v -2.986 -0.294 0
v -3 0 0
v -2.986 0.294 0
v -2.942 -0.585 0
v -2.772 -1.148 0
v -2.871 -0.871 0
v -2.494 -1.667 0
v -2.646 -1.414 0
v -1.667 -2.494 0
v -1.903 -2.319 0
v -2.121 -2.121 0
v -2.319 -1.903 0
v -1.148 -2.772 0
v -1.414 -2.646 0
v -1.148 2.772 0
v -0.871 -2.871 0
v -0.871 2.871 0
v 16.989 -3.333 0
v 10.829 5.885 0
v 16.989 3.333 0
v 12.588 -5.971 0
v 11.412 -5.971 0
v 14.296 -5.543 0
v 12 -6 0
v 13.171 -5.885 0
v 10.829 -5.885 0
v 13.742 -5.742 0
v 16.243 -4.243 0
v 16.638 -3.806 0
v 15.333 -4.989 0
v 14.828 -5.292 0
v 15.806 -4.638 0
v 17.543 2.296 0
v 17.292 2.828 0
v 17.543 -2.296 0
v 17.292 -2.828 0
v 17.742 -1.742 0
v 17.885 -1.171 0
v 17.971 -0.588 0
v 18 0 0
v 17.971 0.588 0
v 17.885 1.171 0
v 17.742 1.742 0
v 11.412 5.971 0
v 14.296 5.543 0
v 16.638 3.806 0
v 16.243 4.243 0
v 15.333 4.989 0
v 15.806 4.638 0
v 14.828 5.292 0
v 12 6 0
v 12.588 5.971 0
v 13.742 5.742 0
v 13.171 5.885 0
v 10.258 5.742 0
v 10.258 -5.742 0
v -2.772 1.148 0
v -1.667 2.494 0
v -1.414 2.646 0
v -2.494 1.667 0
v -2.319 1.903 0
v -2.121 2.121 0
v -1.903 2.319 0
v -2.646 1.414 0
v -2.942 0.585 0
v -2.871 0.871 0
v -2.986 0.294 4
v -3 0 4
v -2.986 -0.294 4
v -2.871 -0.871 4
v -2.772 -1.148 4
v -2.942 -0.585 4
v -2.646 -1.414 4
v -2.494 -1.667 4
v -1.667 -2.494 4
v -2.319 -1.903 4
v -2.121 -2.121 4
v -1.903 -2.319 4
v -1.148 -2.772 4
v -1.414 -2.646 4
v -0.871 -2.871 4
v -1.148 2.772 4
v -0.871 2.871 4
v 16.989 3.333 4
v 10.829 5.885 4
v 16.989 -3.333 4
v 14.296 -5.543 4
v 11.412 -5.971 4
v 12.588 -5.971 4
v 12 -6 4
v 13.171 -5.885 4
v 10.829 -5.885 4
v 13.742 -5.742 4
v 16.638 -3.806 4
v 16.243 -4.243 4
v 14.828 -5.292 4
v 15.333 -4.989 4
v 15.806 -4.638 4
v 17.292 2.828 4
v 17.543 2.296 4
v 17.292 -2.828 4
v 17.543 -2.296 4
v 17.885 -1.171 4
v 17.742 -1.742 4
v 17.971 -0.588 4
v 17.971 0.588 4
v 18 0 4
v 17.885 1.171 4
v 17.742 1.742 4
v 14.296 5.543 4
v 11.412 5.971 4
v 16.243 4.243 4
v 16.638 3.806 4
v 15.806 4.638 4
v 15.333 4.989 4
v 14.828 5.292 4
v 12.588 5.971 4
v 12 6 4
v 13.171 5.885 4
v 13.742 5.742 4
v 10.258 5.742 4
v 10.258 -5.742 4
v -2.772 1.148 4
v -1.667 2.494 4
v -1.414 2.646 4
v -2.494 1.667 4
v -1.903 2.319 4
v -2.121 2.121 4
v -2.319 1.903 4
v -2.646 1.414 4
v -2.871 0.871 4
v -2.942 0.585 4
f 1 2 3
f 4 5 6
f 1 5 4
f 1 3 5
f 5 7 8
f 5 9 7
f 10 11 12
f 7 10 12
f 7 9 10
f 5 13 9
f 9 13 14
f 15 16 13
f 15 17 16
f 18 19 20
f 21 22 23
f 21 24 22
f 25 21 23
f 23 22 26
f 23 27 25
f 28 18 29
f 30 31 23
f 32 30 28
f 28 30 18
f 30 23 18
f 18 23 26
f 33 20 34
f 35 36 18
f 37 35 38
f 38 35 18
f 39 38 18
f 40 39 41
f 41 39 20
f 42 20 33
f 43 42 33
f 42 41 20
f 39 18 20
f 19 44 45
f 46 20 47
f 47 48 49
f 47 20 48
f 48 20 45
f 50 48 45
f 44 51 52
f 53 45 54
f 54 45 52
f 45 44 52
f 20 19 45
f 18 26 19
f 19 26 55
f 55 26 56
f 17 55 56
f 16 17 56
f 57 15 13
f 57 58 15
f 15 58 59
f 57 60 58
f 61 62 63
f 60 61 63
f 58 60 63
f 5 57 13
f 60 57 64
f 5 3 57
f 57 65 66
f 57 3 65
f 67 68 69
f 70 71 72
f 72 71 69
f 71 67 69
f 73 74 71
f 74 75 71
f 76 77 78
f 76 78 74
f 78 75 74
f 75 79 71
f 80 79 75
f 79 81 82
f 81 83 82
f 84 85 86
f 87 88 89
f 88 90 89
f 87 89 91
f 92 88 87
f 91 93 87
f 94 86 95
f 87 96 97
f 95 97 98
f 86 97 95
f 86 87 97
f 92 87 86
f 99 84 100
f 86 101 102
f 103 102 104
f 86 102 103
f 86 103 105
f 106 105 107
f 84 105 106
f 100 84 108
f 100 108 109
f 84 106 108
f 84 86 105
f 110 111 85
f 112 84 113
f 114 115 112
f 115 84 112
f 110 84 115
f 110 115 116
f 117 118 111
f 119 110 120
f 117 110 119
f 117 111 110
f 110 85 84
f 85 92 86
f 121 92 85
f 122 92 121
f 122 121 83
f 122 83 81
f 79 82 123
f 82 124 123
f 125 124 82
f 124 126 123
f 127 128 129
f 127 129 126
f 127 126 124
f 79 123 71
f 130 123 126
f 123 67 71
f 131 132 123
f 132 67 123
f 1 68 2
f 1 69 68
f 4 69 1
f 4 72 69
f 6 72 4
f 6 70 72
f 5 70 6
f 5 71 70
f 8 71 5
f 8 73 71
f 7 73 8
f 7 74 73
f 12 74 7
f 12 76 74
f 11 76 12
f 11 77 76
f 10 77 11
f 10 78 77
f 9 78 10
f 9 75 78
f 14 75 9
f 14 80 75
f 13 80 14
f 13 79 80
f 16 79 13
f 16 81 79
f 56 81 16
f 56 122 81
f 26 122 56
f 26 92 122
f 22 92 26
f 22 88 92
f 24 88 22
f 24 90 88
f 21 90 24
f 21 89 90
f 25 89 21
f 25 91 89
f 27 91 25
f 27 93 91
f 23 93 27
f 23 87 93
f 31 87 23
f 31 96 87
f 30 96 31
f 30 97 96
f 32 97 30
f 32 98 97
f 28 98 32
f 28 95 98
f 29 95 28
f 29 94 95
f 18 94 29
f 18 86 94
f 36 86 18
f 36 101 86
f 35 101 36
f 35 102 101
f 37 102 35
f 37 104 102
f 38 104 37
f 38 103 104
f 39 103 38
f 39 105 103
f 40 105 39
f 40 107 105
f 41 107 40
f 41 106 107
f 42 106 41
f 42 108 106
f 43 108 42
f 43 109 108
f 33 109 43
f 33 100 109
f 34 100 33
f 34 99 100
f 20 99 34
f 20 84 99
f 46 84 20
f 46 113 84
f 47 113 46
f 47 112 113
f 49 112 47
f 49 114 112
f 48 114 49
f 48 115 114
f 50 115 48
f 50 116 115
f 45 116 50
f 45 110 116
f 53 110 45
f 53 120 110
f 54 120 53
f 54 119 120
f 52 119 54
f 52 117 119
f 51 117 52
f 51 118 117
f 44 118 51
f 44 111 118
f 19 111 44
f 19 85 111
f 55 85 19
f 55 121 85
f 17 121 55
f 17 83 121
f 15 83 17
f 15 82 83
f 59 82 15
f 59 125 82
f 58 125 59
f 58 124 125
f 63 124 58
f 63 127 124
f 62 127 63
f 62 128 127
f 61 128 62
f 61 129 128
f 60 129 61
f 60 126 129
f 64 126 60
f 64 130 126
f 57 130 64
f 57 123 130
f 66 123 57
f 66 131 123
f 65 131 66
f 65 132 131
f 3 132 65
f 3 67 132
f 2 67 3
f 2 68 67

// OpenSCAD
linear_extrude(4) hull() { circle(3, $fn = 64); translate([12, 0]) circle(6, $fn = 64); }
